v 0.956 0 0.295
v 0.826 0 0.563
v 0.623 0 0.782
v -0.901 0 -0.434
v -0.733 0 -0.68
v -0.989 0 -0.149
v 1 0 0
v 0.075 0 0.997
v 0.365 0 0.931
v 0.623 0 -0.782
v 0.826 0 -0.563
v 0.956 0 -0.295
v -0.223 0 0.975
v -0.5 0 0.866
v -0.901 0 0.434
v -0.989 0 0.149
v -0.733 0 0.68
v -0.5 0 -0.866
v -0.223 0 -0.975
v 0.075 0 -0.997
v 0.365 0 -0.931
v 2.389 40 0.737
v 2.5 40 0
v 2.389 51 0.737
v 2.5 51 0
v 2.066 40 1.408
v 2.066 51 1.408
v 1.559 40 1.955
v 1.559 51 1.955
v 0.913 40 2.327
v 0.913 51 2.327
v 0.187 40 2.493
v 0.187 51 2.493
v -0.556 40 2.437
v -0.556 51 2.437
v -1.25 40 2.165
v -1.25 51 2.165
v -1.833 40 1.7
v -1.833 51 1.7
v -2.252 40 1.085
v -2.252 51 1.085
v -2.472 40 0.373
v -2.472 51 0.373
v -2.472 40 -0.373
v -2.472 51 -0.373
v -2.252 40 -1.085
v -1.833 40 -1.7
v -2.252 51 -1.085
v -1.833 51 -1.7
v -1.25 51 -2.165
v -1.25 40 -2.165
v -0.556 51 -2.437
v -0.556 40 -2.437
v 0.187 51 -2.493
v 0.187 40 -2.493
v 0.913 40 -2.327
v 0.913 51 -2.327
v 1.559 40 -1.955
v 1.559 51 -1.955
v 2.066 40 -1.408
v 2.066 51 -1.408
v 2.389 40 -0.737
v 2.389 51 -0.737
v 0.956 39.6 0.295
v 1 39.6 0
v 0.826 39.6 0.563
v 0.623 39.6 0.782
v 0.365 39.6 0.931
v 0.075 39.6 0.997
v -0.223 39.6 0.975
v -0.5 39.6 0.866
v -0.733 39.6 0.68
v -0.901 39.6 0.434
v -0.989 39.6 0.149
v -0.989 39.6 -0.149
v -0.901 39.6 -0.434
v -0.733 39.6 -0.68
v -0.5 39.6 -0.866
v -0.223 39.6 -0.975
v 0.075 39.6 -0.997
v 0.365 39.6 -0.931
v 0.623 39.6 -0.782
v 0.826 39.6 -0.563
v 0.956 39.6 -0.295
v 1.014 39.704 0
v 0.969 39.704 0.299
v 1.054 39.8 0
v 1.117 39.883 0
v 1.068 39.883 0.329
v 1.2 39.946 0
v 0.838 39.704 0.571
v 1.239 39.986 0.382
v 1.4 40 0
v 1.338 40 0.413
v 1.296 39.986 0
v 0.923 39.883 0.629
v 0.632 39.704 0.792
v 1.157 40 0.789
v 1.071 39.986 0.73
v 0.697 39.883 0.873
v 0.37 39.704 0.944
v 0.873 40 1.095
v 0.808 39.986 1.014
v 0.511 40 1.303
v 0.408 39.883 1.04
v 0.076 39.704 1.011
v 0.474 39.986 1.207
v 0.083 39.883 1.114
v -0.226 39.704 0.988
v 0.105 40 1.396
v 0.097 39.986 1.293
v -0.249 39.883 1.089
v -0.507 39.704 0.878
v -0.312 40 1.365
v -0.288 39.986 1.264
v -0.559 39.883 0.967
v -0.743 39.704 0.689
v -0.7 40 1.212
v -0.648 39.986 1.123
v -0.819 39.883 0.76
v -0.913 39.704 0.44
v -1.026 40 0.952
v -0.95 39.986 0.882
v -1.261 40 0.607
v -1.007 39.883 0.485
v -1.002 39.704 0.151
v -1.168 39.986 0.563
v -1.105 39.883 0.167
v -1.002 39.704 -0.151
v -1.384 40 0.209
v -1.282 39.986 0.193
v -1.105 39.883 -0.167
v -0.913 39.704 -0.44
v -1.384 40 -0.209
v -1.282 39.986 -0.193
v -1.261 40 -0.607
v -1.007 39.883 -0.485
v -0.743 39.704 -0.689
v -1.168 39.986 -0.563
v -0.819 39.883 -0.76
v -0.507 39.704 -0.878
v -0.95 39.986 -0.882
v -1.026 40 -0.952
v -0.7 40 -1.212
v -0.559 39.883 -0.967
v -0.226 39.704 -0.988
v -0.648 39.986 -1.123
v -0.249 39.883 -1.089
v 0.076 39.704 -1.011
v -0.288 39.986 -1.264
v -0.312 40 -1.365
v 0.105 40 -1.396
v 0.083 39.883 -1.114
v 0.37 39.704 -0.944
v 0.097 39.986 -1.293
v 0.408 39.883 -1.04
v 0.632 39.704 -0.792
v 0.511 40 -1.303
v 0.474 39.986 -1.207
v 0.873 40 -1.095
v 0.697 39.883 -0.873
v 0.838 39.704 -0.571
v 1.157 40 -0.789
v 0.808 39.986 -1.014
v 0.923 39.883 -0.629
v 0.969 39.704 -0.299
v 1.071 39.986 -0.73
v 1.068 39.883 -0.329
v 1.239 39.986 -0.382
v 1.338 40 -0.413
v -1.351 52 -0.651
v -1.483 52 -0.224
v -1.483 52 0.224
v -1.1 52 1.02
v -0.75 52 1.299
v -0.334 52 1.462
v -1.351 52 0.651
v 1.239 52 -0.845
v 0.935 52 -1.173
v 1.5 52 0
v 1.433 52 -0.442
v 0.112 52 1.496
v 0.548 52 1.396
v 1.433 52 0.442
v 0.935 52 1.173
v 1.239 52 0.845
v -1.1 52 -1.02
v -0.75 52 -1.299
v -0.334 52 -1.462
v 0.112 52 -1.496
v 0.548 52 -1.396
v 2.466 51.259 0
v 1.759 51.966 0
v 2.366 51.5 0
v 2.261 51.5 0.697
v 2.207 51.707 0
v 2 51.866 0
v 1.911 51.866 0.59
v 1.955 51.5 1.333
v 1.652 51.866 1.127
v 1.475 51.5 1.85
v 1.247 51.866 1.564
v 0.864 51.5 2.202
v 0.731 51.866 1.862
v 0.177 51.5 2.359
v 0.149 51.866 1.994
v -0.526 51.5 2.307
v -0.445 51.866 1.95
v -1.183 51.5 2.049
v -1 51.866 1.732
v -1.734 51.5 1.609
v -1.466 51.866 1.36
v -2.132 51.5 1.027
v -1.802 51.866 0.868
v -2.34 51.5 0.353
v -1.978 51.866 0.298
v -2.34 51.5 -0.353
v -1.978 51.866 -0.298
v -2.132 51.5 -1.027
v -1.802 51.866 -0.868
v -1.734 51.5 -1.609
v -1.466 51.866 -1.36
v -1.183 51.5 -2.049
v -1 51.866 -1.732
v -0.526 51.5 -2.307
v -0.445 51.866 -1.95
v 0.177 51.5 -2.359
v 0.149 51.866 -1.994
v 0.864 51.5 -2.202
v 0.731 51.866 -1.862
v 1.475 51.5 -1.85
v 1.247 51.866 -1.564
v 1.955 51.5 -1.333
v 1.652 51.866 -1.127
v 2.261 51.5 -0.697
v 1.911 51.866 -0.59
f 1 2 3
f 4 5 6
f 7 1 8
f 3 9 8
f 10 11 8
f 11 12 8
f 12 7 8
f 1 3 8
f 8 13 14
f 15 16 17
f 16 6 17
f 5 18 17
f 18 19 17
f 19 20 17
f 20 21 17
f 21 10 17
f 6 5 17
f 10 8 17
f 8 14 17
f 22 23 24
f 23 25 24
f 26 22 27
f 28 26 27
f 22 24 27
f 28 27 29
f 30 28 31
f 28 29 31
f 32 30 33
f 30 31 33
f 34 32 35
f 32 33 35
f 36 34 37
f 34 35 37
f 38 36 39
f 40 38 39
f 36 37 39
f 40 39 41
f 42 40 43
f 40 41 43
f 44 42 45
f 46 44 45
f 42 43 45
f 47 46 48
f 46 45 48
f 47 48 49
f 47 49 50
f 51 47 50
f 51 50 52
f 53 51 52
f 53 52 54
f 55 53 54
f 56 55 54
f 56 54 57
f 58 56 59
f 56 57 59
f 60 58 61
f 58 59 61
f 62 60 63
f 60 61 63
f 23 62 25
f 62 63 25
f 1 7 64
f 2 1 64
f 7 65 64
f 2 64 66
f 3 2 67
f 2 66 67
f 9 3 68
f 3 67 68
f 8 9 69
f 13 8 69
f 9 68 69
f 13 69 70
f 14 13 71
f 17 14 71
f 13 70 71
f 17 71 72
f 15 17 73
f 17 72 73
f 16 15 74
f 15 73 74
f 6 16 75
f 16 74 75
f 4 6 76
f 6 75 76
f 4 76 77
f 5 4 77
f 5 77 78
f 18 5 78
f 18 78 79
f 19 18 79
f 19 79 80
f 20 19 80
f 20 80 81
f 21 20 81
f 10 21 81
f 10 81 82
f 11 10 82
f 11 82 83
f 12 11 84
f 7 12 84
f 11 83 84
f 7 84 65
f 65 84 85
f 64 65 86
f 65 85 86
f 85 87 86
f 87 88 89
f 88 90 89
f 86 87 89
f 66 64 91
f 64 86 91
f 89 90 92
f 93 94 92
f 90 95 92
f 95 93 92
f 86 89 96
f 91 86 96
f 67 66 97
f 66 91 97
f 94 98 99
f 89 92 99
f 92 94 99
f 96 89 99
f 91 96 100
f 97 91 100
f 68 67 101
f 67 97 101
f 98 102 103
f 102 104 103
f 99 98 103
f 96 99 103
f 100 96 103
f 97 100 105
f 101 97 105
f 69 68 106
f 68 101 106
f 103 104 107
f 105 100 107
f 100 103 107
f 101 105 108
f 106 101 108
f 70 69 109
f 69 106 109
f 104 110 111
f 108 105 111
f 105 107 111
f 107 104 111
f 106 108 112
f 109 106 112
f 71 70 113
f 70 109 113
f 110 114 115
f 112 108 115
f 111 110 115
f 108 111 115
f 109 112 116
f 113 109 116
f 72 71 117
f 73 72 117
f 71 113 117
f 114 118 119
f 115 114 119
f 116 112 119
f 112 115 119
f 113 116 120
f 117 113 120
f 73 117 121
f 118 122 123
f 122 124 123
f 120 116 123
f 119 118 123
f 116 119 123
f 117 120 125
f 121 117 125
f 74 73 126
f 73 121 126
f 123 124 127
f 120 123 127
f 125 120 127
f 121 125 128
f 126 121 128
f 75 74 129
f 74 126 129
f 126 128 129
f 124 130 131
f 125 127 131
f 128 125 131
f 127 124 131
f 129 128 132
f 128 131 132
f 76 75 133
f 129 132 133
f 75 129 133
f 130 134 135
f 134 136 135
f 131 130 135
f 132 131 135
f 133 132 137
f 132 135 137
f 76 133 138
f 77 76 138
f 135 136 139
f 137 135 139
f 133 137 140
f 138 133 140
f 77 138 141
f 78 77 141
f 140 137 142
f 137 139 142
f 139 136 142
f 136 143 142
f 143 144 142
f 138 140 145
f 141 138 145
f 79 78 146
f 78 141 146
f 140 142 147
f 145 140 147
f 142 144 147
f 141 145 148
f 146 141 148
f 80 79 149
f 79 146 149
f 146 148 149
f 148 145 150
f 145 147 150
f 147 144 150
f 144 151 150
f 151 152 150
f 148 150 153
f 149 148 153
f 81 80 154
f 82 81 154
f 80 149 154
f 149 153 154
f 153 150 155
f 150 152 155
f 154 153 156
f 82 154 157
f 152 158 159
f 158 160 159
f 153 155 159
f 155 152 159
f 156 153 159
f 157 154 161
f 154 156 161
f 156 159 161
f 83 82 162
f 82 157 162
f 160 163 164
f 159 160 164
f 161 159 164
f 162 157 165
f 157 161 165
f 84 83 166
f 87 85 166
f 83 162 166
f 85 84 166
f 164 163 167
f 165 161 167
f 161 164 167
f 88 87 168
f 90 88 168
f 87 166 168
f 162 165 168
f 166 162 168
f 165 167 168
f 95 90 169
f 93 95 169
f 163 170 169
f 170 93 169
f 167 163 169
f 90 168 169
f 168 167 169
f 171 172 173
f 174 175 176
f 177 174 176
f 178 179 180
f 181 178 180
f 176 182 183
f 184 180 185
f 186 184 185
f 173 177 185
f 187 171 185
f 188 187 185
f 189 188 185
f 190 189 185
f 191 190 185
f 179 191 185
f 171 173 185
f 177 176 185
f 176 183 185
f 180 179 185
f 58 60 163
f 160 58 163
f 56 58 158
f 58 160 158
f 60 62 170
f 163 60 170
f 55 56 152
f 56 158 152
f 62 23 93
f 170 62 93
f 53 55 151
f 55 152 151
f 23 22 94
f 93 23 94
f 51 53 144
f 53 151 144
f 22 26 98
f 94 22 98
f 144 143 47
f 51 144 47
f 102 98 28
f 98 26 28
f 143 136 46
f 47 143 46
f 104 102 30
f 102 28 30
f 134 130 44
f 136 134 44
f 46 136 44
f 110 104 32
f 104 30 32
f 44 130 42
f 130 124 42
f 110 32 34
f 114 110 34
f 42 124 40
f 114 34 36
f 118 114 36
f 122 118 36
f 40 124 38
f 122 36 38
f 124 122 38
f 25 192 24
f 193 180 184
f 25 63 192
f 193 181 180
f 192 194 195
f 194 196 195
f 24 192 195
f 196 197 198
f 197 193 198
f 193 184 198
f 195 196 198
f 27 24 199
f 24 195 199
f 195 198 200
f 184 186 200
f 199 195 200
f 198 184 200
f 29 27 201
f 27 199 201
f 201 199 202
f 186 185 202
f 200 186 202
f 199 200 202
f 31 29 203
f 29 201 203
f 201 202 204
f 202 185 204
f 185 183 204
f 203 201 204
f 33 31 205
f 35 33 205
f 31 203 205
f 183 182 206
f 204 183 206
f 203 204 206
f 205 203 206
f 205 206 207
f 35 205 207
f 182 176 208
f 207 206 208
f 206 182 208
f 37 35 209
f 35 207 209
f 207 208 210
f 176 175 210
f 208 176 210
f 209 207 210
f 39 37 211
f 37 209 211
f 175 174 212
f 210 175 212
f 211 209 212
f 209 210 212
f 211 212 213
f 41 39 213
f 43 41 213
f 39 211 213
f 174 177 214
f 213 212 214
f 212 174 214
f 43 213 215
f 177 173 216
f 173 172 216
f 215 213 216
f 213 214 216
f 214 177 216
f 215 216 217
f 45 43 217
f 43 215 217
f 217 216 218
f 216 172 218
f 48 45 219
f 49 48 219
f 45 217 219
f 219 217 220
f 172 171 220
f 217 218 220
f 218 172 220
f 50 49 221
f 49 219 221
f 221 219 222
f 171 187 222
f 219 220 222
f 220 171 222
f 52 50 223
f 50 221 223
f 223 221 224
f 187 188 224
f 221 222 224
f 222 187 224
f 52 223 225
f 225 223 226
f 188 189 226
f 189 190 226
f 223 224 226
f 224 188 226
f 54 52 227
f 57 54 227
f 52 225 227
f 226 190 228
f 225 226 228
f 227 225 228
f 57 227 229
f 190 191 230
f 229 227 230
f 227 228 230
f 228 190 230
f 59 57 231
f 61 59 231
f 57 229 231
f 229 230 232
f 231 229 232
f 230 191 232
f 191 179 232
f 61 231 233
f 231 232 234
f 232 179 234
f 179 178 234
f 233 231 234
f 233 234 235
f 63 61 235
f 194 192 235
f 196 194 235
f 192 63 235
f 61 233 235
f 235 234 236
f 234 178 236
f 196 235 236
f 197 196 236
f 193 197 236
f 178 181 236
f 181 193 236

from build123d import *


with BuildPart() as part:
    # Sketch1 → Revolve1 (revolve)
    with BuildSketch(Plane.XY):
        with BuildLine():
            Line((0, 0), (1, 0))
            Line((1, 0), (1, 39.6))
            ThreePointArc((1, 39.6), (1.117157288, 39.882842712), (1.4, 40))
            Line((1.4, 40), (2.5, 40))
            Line((2.5, 40), (2.5, 51))
            ThreePointArc((2.5, 51), (2.207106781, 51.707106781), (1.5, 52))
            Line((1.5, 52), (0, 52))
            Line((0, 52), (0, 0))
        make_face()
    revolve(axis=Axis((0, 52, 0), (0, -1, 0)))


solid = part.part
